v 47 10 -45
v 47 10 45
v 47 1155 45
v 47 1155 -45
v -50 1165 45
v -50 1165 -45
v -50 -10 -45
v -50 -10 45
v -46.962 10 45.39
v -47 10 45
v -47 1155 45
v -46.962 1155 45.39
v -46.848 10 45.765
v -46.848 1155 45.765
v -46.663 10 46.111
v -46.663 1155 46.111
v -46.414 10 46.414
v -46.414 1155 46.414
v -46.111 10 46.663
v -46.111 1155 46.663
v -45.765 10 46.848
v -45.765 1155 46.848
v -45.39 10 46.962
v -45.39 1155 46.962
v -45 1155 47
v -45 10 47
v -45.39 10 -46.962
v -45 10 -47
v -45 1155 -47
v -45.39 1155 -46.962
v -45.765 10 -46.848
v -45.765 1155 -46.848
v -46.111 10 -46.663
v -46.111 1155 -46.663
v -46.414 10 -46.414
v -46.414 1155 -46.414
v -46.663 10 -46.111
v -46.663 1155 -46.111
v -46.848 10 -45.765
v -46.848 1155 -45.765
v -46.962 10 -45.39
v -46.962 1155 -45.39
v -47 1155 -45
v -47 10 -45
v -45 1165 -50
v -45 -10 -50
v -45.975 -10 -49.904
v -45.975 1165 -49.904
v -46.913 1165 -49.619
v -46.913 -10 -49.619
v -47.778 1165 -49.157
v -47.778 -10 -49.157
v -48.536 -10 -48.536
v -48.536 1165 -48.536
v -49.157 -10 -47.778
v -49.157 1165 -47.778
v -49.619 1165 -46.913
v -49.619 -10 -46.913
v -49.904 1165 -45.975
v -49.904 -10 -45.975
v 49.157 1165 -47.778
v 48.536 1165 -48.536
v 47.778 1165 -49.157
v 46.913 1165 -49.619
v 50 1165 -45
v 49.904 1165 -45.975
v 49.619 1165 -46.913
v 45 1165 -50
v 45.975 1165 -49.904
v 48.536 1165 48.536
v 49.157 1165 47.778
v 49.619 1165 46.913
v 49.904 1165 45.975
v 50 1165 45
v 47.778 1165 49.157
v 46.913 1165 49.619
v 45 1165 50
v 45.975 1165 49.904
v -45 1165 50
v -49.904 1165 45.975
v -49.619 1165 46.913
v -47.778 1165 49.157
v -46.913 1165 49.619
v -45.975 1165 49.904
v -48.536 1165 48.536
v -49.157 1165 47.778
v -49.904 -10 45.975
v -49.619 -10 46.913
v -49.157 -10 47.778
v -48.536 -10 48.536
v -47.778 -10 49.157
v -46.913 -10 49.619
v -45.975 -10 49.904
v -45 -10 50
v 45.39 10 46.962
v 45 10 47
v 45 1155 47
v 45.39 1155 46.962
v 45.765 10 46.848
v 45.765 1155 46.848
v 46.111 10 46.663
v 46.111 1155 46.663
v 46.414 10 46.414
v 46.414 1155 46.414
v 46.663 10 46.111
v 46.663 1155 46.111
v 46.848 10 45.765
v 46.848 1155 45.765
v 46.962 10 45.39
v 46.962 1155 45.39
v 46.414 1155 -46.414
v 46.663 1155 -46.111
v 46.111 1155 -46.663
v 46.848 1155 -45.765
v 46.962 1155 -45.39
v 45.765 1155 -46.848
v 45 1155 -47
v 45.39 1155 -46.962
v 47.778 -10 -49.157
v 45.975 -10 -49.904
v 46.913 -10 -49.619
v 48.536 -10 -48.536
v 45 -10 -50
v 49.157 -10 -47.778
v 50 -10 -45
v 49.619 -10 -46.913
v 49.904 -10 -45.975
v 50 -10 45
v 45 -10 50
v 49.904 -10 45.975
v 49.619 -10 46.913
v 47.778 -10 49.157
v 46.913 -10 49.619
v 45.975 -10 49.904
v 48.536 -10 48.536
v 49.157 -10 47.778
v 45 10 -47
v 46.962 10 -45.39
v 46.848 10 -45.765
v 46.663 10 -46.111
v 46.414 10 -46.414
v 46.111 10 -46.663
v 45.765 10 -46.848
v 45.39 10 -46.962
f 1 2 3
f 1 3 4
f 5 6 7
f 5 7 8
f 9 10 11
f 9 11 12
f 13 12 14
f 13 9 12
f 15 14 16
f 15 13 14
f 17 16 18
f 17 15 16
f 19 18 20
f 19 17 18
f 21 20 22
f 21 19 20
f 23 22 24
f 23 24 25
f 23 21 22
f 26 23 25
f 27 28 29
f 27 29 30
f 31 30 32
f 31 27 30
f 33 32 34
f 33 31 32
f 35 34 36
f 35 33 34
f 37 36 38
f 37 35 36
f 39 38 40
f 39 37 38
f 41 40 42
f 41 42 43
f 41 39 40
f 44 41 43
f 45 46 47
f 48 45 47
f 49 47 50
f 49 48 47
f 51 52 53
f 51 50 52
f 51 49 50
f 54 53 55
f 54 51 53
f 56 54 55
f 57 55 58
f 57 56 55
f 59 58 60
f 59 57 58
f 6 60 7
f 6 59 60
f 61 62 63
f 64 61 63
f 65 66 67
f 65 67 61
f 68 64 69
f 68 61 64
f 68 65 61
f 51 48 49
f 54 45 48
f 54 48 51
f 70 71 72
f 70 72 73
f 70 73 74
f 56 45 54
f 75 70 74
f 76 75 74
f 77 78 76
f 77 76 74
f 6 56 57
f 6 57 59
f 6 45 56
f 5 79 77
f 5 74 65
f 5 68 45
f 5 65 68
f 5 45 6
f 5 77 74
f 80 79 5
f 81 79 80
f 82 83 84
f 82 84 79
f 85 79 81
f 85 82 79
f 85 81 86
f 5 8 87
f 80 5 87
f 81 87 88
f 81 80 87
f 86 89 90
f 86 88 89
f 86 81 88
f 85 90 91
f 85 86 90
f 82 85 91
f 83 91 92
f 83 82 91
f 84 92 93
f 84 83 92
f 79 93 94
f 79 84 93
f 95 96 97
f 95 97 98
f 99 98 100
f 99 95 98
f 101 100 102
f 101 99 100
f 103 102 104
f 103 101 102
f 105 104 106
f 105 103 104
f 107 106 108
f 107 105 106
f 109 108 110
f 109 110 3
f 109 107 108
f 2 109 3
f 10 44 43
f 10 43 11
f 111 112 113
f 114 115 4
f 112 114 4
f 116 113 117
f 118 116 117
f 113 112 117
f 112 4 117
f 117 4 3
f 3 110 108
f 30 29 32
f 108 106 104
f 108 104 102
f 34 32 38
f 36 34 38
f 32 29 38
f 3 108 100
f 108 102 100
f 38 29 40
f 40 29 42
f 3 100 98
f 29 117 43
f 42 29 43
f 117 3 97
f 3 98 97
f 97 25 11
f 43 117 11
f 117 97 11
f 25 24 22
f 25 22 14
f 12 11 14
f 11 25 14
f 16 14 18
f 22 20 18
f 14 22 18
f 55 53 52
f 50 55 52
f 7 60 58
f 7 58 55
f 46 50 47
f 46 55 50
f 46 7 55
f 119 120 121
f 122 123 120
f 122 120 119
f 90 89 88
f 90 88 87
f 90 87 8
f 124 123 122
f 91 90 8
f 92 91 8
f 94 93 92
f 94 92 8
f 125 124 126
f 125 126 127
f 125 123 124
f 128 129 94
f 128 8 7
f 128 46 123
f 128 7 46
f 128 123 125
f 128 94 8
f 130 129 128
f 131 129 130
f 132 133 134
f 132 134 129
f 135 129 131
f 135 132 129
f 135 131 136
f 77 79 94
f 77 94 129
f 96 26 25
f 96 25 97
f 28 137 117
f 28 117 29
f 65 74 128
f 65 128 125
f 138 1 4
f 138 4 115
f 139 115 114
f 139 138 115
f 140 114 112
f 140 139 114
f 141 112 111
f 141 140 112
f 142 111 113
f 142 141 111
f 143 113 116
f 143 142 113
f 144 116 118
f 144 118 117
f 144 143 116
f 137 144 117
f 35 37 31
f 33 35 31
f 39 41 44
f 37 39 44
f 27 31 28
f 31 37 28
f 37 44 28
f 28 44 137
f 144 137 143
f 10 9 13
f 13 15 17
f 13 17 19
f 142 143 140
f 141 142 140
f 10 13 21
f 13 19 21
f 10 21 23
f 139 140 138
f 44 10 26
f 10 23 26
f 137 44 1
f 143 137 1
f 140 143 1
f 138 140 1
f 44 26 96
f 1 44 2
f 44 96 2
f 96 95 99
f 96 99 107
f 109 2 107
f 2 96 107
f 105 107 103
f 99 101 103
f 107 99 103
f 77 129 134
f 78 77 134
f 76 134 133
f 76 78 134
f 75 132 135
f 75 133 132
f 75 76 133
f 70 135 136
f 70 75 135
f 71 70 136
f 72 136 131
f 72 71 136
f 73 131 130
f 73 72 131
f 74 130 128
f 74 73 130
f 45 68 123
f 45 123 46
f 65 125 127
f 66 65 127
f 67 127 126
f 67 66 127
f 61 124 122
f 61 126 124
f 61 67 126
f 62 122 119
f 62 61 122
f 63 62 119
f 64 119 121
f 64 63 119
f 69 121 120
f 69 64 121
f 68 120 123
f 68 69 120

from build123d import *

# Parameters (mm, degrees)
F1_DEPTH = 1155
F4_DEPTH = 20
F7_DEPTH = 10


with BuildPart() as f1:
    # F0 (on Front) → F1 (new body)
    with BuildSketch(Plane.XZ):
        with BuildLine():
            ThreePointArc((50, 45), (48.5355339059, 48.5355339059), (45, 50))
            Line((45, 50), (-45, 50))
            ThreePointArc((-45, 50), (-48.5355339059, 48.5355339059), (-50, 45))
            Line((-50, 45), (-50, -45))
            ThreePointArc((-50, -45), (-48.5355339059, -48.5355339059), (-45, -50))
            Line((-45, -50), (45, -50))
            ThreePointArc((45, -50), (48.5355339059, -48.5355339059), (50, -45))
            Line((50, -45), (50, 45))
        make_face()
        with BuildLine():
            ThreePointArc((-47, 45), (-46.4142135624, 46.4142135624), (-45, 47))
            Line((-45, 47), (45, 47))
            ThreePointArc((45, 47), (46.4142135624, 46.4142135624), (47, 45))
            Line((47, 45), (47, -45))
            ThreePointArc((47, -45), (46.4142135624, -46.4142135624), (45, -47))
            Line((45, -47), (-45, -47))
            ThreePointArc((-45, -47), (-46.4142135624, -46.4142135624), (-47, -45))
            Line((-47, -45), (-47, 45))
        make_face(mode=Mode.SUBTRACT)
    extrude(amount=-F1_DEPTH)

    # F3 (on offset) → F4 (join)
    with BuildSketch(Plane.XZ.offset(10)):
        with BuildLine():
            Line((45, 50), (-45, 50))
            ThreePointArc((-45, 50), (-48.5355339059, 48.5355339059), (-50, 45))
            Line((-50, 45), (-50, -45))
            ThreePointArc((-50, -45), (-48.5355339059, -48.5355339059), (-45, -50))
            Line((-45, -50), (45, -50))
            ThreePointArc((45, -50), (48.5355339059, -48.5355339059), (50, -45))
            Line((50, -45), (50, 45))
            ThreePointArc((50, 45), (48.5355339059, 48.5355339059), (45, 50))
        make_face()
    extrude(amount=-F4_DEPTH)

    # F6 (on offset) → F7 (join)
    with BuildSketch(Plane(origin=(0, 1165, 0), x_dir=(-1, 0, 0), z_dir=(0, 1, 0))):
        with BuildLine():
            Line((45, 50), (-45, 50))
            ThreePointArc((-45, 50), (-48.5355339059, 48.5355339059), (-50, 45))
            Line((-50, 45), (-50, -45))
            ThreePointArc((-50, -45), (-48.5355339059, -48.5355339059), (-45, -50))
            Line((-45, -50), (45, -50))
            ThreePointArc((45, -50), (48.5355339059, -48.5355339059), (50, -45))
            Line((50, -45), (50, 45))
            ThreePointArc((50, 45), (48.5355339059, 48.5355339059), (45, 50))
        make_face()
    extrude(amount=-F7_DEPTH)


solid = f1.part
